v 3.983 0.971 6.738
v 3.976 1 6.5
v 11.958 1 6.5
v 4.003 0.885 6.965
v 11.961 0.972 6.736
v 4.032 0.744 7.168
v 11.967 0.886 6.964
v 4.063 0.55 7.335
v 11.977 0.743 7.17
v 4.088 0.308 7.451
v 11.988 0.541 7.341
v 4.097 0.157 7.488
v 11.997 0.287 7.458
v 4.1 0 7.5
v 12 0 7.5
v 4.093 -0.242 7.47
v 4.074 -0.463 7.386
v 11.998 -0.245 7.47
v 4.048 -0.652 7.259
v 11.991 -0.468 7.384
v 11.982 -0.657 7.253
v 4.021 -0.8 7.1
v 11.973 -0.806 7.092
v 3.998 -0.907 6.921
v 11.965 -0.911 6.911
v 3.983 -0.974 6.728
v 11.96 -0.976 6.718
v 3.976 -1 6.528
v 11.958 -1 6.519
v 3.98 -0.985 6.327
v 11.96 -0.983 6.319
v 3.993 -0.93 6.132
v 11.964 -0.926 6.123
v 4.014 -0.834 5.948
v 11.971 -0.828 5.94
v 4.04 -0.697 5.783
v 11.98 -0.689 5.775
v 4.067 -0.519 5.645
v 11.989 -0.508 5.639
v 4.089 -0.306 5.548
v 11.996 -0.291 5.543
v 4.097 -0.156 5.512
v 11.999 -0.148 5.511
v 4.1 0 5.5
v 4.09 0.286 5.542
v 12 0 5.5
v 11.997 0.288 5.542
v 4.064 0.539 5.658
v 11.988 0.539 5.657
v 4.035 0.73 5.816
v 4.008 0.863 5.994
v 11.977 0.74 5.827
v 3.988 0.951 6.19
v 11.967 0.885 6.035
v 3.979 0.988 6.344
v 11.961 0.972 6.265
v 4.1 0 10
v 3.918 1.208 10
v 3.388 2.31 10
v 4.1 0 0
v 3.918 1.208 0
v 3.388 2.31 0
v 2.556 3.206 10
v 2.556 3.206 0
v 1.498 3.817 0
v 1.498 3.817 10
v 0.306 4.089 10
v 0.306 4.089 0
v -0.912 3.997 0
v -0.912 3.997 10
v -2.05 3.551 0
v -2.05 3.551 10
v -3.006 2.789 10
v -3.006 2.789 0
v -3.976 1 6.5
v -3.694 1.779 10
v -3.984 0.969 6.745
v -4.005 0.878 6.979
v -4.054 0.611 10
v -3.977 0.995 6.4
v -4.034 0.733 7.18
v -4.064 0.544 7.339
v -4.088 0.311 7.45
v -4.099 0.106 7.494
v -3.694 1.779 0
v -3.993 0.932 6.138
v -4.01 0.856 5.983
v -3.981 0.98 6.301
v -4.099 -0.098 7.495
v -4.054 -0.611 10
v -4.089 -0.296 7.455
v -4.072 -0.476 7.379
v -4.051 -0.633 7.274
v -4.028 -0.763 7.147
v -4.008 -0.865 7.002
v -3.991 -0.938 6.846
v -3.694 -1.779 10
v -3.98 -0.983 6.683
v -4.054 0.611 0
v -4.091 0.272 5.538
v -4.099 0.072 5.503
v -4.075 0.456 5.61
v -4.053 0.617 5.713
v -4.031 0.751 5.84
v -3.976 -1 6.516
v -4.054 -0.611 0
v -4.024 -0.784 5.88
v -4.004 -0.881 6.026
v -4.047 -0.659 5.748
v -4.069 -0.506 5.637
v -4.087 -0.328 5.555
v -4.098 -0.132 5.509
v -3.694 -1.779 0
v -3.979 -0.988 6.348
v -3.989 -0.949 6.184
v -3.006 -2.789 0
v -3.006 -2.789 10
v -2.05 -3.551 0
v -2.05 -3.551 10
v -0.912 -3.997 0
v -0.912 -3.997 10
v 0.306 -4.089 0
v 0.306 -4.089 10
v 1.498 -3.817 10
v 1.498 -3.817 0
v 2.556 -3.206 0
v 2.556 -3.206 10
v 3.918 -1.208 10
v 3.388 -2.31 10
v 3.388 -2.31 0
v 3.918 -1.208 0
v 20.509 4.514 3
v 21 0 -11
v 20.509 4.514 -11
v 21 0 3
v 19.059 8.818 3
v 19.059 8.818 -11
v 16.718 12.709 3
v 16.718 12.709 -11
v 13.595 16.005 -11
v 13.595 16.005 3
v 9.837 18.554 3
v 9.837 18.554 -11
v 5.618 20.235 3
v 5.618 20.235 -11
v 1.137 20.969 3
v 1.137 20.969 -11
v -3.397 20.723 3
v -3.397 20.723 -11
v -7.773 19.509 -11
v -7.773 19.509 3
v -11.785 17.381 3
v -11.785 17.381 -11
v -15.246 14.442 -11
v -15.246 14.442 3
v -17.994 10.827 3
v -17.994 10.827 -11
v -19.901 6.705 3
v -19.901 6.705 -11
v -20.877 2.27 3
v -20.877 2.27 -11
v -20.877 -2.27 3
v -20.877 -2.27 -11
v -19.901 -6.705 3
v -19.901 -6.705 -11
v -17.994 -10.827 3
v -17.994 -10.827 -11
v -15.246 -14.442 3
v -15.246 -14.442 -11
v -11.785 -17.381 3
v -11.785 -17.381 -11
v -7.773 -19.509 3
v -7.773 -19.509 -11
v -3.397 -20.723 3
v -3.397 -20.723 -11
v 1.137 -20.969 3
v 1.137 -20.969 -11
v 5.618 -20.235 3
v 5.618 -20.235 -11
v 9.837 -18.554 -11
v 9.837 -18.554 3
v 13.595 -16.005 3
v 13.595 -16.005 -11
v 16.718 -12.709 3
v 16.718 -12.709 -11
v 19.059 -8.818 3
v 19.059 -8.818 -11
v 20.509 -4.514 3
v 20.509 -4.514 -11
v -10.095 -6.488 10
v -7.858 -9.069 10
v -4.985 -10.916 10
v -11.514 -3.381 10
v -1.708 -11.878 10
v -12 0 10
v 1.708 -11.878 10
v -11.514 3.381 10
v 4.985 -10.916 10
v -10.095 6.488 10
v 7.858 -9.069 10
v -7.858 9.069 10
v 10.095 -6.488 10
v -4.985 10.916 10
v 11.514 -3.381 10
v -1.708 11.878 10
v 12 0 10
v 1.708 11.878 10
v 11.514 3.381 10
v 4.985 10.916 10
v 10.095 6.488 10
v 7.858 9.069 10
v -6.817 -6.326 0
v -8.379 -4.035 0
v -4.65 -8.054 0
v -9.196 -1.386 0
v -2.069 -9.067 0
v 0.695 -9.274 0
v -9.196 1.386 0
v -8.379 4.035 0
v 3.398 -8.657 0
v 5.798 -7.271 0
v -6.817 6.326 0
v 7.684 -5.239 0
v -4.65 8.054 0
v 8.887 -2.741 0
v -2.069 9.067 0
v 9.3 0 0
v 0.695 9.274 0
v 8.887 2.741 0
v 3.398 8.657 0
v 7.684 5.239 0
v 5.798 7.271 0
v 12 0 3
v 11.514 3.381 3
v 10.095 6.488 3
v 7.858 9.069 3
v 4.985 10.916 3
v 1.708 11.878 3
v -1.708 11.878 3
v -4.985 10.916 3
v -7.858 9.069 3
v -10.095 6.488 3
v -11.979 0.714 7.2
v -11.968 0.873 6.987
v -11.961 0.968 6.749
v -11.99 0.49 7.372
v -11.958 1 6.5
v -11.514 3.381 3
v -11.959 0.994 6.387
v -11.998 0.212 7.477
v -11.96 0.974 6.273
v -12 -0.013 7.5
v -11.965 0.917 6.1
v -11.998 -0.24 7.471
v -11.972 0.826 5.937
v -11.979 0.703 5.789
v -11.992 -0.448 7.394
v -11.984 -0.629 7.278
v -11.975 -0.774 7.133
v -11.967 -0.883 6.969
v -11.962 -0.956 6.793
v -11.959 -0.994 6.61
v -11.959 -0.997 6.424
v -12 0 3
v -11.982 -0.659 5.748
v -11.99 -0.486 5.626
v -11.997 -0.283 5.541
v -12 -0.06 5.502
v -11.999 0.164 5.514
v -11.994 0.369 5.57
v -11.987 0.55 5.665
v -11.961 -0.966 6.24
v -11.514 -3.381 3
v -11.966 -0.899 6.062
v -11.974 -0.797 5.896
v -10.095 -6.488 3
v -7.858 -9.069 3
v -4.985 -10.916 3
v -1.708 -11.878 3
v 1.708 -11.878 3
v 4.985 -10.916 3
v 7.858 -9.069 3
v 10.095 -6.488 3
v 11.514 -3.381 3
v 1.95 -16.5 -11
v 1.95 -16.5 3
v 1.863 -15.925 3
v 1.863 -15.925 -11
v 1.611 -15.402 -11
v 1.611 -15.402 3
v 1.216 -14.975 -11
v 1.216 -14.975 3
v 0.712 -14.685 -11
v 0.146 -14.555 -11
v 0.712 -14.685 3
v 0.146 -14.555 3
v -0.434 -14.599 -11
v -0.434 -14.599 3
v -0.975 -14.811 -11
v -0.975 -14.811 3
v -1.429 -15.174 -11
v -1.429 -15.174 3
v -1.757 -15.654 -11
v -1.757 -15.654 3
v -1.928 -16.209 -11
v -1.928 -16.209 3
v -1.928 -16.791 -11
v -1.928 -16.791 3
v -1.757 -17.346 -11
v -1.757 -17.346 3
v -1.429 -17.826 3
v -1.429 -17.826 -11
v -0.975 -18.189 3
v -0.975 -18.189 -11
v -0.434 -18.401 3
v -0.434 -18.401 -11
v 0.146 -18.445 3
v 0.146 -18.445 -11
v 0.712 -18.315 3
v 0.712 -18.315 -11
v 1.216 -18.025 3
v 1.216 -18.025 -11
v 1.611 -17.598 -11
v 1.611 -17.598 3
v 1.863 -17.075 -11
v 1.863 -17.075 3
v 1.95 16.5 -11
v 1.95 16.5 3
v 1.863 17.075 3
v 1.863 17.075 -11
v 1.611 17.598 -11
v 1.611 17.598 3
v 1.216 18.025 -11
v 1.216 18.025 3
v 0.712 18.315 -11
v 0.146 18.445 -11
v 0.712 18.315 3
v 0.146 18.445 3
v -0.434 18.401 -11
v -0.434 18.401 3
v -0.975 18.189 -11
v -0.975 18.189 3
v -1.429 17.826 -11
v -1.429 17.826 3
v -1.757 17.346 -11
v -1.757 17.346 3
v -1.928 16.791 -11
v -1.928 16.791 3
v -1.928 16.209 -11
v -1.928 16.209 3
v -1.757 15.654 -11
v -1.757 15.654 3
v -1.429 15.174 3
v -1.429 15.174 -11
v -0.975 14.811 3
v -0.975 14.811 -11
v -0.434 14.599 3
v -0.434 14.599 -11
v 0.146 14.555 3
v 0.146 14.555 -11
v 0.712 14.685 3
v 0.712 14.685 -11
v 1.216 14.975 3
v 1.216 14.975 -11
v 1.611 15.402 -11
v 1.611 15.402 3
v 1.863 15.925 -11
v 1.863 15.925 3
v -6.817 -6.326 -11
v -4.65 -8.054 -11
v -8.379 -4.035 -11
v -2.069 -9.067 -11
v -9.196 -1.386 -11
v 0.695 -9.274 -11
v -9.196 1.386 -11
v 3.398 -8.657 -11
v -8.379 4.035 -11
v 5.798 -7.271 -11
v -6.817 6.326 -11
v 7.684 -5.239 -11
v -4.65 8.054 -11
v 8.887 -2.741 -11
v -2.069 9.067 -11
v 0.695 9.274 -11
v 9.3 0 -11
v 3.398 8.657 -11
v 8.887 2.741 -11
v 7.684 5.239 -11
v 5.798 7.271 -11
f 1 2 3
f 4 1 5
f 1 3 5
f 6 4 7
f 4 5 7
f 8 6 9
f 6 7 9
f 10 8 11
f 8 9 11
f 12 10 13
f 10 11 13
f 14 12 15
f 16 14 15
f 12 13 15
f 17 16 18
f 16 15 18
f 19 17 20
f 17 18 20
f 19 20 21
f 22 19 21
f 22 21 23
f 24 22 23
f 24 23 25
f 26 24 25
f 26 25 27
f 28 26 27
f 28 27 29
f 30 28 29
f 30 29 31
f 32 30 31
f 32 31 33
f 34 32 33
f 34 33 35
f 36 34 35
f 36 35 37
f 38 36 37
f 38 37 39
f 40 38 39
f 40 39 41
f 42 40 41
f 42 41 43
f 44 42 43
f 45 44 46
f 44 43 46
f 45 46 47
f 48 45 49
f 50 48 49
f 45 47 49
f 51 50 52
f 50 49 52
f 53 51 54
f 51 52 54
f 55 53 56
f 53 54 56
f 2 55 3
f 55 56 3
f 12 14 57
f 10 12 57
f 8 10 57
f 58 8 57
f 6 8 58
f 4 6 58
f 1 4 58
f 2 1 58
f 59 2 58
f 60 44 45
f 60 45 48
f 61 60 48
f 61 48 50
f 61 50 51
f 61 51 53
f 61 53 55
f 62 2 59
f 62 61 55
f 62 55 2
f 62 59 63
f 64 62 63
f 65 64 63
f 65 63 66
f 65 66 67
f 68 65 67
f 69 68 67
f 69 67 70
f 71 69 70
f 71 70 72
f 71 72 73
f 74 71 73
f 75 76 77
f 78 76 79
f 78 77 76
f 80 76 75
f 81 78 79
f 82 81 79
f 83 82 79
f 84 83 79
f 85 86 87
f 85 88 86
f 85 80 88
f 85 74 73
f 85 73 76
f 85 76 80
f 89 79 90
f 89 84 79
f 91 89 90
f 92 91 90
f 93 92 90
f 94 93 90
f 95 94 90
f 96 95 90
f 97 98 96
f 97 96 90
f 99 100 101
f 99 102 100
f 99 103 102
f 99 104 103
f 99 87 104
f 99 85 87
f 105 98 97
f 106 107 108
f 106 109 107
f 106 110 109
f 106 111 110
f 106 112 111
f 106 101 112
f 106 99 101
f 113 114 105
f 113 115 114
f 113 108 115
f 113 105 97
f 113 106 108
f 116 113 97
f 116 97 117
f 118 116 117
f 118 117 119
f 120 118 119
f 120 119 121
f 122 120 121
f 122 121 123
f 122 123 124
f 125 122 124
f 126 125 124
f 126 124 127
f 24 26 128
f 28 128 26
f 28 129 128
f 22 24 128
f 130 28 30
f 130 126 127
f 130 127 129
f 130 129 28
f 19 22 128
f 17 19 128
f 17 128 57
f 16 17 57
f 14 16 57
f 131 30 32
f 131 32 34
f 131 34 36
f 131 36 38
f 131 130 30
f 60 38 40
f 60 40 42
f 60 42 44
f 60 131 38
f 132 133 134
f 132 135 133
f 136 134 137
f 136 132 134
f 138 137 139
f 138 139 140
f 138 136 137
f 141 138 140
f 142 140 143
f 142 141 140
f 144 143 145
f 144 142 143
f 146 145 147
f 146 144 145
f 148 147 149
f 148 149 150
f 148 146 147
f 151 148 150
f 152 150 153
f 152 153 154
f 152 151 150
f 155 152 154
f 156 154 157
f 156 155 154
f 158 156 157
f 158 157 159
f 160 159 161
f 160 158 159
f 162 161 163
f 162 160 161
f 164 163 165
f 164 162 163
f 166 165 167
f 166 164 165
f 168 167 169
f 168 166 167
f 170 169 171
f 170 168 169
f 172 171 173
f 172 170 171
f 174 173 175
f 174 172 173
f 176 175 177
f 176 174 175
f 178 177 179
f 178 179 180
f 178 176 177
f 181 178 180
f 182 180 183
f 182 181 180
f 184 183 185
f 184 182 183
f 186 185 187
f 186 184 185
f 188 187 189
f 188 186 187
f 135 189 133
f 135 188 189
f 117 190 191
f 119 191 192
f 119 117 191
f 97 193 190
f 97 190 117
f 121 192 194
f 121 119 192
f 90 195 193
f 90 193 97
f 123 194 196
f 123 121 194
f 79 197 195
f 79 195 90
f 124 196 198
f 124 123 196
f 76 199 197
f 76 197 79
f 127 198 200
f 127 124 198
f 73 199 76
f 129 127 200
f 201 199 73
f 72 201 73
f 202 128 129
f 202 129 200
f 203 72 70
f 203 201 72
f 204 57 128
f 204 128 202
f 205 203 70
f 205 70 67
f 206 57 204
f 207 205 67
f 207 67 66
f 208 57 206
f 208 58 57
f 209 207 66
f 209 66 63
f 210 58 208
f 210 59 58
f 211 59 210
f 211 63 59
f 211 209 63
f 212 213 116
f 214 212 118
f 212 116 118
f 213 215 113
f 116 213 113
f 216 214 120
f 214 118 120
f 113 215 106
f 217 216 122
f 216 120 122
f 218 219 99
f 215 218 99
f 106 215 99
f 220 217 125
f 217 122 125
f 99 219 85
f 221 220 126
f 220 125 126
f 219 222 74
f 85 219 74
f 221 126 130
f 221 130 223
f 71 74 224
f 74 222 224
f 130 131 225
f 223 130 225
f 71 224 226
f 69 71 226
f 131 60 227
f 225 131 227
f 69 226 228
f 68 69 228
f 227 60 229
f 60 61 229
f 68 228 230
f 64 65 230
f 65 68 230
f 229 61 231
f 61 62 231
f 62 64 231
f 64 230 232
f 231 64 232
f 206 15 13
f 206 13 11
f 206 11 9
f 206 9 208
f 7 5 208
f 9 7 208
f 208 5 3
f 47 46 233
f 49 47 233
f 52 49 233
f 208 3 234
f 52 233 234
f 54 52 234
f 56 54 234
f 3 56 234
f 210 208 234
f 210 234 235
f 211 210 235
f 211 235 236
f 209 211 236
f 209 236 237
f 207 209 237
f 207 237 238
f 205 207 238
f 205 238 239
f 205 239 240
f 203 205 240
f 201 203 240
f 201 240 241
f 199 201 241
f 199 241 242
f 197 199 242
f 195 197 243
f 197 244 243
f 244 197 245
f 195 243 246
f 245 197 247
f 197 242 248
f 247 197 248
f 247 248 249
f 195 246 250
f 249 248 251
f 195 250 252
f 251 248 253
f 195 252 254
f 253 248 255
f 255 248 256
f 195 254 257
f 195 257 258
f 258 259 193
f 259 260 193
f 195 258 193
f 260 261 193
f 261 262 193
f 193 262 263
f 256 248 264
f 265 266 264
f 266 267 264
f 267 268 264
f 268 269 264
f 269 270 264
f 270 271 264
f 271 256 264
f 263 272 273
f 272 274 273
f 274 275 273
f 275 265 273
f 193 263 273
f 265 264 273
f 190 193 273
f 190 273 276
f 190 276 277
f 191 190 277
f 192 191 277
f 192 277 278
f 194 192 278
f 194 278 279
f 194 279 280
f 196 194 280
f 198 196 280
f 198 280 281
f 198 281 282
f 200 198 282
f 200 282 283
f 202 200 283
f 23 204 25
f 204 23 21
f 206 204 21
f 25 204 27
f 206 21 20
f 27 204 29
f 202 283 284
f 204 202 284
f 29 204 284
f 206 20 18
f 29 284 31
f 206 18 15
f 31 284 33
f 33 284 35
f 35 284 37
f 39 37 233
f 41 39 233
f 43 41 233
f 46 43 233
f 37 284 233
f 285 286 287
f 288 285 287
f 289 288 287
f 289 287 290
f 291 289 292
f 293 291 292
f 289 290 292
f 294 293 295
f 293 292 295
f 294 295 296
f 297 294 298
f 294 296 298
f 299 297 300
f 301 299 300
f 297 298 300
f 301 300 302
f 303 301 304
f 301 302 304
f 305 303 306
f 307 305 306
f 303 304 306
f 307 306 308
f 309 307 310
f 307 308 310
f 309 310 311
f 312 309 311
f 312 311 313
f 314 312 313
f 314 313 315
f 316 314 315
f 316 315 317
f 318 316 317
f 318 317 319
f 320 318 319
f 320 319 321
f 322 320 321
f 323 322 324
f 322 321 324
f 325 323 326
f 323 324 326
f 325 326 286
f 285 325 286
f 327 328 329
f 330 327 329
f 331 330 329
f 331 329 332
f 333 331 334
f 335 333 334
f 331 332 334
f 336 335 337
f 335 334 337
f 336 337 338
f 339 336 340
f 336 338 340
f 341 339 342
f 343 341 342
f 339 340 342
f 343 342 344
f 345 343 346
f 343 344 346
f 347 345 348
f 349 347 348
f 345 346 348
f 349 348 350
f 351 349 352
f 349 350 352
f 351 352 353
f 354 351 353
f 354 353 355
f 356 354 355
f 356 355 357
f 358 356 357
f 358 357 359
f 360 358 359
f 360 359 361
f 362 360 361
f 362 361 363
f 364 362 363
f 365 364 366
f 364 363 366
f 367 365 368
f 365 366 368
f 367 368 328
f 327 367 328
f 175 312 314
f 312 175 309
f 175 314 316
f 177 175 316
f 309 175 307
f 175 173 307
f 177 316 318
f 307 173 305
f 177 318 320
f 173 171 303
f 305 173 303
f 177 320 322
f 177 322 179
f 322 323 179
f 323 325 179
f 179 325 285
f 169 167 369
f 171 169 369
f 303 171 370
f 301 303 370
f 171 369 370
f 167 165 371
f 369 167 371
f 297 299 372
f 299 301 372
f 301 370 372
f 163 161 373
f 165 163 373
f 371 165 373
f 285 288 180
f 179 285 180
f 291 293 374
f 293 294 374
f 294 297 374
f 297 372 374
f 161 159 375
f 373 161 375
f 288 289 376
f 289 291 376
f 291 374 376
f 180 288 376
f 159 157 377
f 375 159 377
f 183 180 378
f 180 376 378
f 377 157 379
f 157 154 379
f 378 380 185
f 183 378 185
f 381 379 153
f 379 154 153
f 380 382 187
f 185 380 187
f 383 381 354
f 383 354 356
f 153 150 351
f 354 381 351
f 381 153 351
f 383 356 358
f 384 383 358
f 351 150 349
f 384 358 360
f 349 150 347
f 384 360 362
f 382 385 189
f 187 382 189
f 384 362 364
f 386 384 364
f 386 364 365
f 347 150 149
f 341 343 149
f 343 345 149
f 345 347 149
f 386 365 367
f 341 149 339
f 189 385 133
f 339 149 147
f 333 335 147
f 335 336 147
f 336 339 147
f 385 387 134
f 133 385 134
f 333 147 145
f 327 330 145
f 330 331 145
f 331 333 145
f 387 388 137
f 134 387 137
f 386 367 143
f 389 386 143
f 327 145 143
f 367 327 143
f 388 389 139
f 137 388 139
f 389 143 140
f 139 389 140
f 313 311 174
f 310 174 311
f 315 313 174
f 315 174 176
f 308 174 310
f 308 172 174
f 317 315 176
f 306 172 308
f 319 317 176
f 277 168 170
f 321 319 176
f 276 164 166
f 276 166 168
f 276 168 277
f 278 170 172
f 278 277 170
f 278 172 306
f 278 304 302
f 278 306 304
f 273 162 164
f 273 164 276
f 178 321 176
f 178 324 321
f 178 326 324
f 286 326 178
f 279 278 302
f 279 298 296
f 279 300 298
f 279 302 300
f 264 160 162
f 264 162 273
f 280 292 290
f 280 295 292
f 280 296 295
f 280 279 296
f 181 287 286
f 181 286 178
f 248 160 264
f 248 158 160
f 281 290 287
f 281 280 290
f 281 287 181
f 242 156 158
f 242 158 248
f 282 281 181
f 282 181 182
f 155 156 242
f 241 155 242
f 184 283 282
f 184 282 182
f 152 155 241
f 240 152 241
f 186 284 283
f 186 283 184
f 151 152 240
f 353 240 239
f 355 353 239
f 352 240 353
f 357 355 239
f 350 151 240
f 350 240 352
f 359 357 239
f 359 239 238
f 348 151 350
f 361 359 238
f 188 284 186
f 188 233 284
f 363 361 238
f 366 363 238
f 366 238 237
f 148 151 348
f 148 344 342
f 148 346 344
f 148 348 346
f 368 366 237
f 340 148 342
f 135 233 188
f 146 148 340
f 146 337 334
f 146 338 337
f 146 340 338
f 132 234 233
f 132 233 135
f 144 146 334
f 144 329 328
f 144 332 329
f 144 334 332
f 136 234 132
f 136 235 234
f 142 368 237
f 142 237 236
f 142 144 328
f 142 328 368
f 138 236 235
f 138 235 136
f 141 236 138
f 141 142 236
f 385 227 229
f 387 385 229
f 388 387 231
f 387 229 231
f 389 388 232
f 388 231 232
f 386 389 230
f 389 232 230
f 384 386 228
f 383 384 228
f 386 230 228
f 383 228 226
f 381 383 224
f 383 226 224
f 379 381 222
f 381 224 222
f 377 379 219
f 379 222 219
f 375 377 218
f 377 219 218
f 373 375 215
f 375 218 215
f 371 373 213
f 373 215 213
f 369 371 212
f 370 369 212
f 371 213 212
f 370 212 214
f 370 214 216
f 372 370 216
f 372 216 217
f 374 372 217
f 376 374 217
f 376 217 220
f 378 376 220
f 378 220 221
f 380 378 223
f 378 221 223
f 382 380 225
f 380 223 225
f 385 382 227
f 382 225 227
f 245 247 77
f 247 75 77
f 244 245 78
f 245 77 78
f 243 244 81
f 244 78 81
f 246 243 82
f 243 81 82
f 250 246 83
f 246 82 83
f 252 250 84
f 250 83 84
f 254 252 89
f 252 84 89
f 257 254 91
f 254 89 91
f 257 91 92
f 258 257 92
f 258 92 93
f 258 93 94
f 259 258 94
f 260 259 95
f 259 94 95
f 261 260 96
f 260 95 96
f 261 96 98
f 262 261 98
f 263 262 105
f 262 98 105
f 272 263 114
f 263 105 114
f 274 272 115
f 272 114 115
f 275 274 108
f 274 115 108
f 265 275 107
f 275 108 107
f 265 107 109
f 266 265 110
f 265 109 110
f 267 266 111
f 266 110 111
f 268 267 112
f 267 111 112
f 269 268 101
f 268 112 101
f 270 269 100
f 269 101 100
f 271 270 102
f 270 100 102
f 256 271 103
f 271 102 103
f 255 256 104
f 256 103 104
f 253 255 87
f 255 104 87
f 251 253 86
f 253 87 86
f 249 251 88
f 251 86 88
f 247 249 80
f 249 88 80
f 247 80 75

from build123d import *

# Parameters (mm, degrees)
F0_R     = 21
F0_R_2   = 12
F0_R_3   = 4.1
F1_DEPTH = 3
F2_DEPTH = 10
F3_R     = 21
F3_R_2   = 9.3
F4_DEPTH = 11
F5_R     = 1.95
F6_DEPTH = 14
F7_R     = 1
F8_DEPTH = 12.5


with BuildPart() as f1:
    # F0 (on Top) → F1 (new body)
    with BuildSketch(Plane.XY):
        Circle(F0_R)
        Circle(F0_R_2, mode=Mode.SUBTRACT)
        Circle(F0_R_2)
        Circle(F0_R_3, mode=Mode.SUBTRACT)
    extrude(amount=F1_DEPTH)

    # F0 (on Top) → F2 (join)
    with BuildSketch(Plane.XY):
        Circle(F0_R_2)
        Circle(F0_R_3, mode=Mode.SUBTRACT)
    extrude(amount=F2_DEPTH)

    # F3 (on Top) → F4 (join)
    with BuildSketch(Plane.XY):
        Circle(F3_R)
        Circle(F3_R_2, mode=Mode.SUBTRACT)
    extrude(amount=-F4_DEPTH)

    # F5 (on face) → F6 (cut, through all)
    with BuildSketch(Plane.XY.offset(3)):
        with Locations((0, 16.5)):
            Circle(F5_R)
        with Locations((0, -16.5)):
            Circle(F5_R)
    extrude(amount=-F6_DEPTH, mode=Mode.SUBTRACT)

    # F7 (on Right) → F8 (cut, symmetric)
    with BuildSketch(Plane.YZ):
        with Locations((0, 6.5)):
            Circle(F7_R)
    extrude(amount=F8_DEPTH, both=True, mode=Mode.SUBTRACT)


solid = f1.part
